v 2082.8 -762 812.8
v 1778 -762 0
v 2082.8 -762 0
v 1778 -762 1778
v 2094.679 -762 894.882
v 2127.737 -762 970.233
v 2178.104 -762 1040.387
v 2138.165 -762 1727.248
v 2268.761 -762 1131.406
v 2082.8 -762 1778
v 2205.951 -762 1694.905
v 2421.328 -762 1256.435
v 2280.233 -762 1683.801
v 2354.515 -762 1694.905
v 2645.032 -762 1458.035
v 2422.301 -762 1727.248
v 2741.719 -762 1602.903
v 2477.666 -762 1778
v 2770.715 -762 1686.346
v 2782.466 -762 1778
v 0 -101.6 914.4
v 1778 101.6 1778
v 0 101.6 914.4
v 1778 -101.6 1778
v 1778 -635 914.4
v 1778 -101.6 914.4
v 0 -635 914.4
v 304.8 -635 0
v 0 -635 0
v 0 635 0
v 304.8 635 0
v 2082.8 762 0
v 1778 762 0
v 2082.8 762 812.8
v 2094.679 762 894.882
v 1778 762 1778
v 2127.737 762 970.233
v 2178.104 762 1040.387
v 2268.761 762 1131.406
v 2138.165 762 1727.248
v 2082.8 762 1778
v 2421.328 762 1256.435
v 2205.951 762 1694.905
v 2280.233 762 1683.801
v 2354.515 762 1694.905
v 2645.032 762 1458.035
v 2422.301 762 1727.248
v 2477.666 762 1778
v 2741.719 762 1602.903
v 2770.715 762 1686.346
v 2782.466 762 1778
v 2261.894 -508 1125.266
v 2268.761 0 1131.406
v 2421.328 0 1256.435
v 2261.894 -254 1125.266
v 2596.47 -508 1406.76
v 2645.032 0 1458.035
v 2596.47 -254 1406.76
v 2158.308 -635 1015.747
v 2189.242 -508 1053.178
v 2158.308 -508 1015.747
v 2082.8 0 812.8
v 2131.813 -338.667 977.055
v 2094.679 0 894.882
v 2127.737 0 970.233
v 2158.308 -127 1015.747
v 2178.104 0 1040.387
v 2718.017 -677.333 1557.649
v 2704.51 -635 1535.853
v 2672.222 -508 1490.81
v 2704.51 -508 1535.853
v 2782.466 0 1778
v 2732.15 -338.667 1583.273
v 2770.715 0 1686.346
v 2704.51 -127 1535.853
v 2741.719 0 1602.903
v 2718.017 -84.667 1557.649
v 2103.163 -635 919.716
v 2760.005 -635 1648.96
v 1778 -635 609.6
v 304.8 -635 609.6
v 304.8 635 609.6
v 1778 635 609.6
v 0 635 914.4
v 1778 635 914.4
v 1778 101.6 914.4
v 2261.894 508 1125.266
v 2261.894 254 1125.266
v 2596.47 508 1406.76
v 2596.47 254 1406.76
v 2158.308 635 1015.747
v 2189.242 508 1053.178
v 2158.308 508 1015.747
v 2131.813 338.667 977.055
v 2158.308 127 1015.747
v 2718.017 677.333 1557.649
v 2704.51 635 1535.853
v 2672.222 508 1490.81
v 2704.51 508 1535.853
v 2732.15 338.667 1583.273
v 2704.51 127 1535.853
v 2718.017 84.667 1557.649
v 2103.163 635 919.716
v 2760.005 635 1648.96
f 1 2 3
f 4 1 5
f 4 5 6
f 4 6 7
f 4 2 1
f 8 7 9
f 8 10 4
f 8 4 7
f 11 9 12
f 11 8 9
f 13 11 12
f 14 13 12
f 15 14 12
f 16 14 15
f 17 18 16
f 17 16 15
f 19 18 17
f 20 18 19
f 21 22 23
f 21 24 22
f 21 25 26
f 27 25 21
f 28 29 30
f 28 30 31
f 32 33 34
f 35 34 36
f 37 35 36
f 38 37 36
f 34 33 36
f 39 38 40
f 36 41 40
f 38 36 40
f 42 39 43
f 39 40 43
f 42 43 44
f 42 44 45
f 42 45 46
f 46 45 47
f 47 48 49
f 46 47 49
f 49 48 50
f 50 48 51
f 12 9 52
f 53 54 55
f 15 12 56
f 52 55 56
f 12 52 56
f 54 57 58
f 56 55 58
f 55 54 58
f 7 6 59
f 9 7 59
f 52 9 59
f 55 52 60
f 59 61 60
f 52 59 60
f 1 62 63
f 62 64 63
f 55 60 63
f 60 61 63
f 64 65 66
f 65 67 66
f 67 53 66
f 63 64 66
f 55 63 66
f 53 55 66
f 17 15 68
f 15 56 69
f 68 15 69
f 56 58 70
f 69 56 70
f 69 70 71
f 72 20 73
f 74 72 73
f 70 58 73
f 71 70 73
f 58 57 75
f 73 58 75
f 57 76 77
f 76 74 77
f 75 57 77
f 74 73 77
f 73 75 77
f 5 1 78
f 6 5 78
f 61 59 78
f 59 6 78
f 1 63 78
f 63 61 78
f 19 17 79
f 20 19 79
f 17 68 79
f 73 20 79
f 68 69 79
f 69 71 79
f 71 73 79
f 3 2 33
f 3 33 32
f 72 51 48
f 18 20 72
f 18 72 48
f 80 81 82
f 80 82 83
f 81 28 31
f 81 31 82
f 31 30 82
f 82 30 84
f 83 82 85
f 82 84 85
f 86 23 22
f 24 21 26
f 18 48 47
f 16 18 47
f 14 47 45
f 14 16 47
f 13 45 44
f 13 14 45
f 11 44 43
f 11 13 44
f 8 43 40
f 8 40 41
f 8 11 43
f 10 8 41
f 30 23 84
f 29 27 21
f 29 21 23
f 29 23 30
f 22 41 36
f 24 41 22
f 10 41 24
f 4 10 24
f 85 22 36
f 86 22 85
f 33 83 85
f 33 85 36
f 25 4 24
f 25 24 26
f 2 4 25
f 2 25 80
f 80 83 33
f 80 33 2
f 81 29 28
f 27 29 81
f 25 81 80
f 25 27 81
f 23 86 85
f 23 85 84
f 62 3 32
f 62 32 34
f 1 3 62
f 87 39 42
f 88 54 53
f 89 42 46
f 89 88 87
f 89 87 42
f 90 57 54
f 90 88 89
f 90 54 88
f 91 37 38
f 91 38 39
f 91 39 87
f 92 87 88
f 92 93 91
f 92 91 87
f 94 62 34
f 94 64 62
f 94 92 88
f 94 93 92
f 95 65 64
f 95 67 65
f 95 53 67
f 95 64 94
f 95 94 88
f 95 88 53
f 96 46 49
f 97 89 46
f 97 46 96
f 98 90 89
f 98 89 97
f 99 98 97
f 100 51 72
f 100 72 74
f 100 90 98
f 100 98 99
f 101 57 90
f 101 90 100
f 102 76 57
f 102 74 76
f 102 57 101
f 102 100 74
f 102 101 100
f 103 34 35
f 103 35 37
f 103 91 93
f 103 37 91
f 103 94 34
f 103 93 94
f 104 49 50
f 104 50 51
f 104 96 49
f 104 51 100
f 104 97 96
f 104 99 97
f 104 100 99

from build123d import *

# Parameters (mm, degrees)
F1_DEPTH = 762
F2_DEPTH = 635
F3_DEPTH = 101.6


with BuildPart() as f1:
    # F0 (on Front) → F1 (new body, symmetric)
    with BuildSketch(Plane.XZ):
        with BuildLine():
            Line((1778, 1778), (1778, 914.4))
            Line((1778, 914.4), (1778, 609.6))
            Line((1778, 609.6), (1778, 0))
            Line((1778, 0), (2082.8, 0))
            Line((2082.8, 0), (2082.8, 812.8))
            add(Edge.make_bspline(
                [(2082.8, 812.8), (2082.8, 1180.991204), (2772.113323, 1321.647525), (2782.465871, 1778)],
                knots=[0, 0, 0, 0, 1192.11718, 1192.11718, 1192.11718, 1192.11718], degree=3))
            Line((2782.465871, 1778), (2477.665871, 1778))
            ThreePointArc((2477.665871, 1778), (2280.232936, 1683.800613), (2082.8, 1778))
            Line((2082.8, 1778), (1778, 1778))
        make_face()
    extrude(amount=F1_DEPTH, both=True)

    # F0 (on Front) → F2 (join, symmetric)
    with BuildSketch(Plane.XZ):
        Polygon((0, 914.4), (0, 0), (304.8, 0), (304.8, 609.6), (1778, 609.6), (1778, 914.4), align=None)
    extrude(amount=F2_DEPTH, both=True)

    # F0 (on Front) → F3 (join, symmetric)
    with BuildSketch(Plane.XZ):
        Polygon((1778, 1778), (0, 914.4), (1778, 914.4), align=None)
    extrude(amount=F3_DEPTH, both=True)


solid = f1.part
